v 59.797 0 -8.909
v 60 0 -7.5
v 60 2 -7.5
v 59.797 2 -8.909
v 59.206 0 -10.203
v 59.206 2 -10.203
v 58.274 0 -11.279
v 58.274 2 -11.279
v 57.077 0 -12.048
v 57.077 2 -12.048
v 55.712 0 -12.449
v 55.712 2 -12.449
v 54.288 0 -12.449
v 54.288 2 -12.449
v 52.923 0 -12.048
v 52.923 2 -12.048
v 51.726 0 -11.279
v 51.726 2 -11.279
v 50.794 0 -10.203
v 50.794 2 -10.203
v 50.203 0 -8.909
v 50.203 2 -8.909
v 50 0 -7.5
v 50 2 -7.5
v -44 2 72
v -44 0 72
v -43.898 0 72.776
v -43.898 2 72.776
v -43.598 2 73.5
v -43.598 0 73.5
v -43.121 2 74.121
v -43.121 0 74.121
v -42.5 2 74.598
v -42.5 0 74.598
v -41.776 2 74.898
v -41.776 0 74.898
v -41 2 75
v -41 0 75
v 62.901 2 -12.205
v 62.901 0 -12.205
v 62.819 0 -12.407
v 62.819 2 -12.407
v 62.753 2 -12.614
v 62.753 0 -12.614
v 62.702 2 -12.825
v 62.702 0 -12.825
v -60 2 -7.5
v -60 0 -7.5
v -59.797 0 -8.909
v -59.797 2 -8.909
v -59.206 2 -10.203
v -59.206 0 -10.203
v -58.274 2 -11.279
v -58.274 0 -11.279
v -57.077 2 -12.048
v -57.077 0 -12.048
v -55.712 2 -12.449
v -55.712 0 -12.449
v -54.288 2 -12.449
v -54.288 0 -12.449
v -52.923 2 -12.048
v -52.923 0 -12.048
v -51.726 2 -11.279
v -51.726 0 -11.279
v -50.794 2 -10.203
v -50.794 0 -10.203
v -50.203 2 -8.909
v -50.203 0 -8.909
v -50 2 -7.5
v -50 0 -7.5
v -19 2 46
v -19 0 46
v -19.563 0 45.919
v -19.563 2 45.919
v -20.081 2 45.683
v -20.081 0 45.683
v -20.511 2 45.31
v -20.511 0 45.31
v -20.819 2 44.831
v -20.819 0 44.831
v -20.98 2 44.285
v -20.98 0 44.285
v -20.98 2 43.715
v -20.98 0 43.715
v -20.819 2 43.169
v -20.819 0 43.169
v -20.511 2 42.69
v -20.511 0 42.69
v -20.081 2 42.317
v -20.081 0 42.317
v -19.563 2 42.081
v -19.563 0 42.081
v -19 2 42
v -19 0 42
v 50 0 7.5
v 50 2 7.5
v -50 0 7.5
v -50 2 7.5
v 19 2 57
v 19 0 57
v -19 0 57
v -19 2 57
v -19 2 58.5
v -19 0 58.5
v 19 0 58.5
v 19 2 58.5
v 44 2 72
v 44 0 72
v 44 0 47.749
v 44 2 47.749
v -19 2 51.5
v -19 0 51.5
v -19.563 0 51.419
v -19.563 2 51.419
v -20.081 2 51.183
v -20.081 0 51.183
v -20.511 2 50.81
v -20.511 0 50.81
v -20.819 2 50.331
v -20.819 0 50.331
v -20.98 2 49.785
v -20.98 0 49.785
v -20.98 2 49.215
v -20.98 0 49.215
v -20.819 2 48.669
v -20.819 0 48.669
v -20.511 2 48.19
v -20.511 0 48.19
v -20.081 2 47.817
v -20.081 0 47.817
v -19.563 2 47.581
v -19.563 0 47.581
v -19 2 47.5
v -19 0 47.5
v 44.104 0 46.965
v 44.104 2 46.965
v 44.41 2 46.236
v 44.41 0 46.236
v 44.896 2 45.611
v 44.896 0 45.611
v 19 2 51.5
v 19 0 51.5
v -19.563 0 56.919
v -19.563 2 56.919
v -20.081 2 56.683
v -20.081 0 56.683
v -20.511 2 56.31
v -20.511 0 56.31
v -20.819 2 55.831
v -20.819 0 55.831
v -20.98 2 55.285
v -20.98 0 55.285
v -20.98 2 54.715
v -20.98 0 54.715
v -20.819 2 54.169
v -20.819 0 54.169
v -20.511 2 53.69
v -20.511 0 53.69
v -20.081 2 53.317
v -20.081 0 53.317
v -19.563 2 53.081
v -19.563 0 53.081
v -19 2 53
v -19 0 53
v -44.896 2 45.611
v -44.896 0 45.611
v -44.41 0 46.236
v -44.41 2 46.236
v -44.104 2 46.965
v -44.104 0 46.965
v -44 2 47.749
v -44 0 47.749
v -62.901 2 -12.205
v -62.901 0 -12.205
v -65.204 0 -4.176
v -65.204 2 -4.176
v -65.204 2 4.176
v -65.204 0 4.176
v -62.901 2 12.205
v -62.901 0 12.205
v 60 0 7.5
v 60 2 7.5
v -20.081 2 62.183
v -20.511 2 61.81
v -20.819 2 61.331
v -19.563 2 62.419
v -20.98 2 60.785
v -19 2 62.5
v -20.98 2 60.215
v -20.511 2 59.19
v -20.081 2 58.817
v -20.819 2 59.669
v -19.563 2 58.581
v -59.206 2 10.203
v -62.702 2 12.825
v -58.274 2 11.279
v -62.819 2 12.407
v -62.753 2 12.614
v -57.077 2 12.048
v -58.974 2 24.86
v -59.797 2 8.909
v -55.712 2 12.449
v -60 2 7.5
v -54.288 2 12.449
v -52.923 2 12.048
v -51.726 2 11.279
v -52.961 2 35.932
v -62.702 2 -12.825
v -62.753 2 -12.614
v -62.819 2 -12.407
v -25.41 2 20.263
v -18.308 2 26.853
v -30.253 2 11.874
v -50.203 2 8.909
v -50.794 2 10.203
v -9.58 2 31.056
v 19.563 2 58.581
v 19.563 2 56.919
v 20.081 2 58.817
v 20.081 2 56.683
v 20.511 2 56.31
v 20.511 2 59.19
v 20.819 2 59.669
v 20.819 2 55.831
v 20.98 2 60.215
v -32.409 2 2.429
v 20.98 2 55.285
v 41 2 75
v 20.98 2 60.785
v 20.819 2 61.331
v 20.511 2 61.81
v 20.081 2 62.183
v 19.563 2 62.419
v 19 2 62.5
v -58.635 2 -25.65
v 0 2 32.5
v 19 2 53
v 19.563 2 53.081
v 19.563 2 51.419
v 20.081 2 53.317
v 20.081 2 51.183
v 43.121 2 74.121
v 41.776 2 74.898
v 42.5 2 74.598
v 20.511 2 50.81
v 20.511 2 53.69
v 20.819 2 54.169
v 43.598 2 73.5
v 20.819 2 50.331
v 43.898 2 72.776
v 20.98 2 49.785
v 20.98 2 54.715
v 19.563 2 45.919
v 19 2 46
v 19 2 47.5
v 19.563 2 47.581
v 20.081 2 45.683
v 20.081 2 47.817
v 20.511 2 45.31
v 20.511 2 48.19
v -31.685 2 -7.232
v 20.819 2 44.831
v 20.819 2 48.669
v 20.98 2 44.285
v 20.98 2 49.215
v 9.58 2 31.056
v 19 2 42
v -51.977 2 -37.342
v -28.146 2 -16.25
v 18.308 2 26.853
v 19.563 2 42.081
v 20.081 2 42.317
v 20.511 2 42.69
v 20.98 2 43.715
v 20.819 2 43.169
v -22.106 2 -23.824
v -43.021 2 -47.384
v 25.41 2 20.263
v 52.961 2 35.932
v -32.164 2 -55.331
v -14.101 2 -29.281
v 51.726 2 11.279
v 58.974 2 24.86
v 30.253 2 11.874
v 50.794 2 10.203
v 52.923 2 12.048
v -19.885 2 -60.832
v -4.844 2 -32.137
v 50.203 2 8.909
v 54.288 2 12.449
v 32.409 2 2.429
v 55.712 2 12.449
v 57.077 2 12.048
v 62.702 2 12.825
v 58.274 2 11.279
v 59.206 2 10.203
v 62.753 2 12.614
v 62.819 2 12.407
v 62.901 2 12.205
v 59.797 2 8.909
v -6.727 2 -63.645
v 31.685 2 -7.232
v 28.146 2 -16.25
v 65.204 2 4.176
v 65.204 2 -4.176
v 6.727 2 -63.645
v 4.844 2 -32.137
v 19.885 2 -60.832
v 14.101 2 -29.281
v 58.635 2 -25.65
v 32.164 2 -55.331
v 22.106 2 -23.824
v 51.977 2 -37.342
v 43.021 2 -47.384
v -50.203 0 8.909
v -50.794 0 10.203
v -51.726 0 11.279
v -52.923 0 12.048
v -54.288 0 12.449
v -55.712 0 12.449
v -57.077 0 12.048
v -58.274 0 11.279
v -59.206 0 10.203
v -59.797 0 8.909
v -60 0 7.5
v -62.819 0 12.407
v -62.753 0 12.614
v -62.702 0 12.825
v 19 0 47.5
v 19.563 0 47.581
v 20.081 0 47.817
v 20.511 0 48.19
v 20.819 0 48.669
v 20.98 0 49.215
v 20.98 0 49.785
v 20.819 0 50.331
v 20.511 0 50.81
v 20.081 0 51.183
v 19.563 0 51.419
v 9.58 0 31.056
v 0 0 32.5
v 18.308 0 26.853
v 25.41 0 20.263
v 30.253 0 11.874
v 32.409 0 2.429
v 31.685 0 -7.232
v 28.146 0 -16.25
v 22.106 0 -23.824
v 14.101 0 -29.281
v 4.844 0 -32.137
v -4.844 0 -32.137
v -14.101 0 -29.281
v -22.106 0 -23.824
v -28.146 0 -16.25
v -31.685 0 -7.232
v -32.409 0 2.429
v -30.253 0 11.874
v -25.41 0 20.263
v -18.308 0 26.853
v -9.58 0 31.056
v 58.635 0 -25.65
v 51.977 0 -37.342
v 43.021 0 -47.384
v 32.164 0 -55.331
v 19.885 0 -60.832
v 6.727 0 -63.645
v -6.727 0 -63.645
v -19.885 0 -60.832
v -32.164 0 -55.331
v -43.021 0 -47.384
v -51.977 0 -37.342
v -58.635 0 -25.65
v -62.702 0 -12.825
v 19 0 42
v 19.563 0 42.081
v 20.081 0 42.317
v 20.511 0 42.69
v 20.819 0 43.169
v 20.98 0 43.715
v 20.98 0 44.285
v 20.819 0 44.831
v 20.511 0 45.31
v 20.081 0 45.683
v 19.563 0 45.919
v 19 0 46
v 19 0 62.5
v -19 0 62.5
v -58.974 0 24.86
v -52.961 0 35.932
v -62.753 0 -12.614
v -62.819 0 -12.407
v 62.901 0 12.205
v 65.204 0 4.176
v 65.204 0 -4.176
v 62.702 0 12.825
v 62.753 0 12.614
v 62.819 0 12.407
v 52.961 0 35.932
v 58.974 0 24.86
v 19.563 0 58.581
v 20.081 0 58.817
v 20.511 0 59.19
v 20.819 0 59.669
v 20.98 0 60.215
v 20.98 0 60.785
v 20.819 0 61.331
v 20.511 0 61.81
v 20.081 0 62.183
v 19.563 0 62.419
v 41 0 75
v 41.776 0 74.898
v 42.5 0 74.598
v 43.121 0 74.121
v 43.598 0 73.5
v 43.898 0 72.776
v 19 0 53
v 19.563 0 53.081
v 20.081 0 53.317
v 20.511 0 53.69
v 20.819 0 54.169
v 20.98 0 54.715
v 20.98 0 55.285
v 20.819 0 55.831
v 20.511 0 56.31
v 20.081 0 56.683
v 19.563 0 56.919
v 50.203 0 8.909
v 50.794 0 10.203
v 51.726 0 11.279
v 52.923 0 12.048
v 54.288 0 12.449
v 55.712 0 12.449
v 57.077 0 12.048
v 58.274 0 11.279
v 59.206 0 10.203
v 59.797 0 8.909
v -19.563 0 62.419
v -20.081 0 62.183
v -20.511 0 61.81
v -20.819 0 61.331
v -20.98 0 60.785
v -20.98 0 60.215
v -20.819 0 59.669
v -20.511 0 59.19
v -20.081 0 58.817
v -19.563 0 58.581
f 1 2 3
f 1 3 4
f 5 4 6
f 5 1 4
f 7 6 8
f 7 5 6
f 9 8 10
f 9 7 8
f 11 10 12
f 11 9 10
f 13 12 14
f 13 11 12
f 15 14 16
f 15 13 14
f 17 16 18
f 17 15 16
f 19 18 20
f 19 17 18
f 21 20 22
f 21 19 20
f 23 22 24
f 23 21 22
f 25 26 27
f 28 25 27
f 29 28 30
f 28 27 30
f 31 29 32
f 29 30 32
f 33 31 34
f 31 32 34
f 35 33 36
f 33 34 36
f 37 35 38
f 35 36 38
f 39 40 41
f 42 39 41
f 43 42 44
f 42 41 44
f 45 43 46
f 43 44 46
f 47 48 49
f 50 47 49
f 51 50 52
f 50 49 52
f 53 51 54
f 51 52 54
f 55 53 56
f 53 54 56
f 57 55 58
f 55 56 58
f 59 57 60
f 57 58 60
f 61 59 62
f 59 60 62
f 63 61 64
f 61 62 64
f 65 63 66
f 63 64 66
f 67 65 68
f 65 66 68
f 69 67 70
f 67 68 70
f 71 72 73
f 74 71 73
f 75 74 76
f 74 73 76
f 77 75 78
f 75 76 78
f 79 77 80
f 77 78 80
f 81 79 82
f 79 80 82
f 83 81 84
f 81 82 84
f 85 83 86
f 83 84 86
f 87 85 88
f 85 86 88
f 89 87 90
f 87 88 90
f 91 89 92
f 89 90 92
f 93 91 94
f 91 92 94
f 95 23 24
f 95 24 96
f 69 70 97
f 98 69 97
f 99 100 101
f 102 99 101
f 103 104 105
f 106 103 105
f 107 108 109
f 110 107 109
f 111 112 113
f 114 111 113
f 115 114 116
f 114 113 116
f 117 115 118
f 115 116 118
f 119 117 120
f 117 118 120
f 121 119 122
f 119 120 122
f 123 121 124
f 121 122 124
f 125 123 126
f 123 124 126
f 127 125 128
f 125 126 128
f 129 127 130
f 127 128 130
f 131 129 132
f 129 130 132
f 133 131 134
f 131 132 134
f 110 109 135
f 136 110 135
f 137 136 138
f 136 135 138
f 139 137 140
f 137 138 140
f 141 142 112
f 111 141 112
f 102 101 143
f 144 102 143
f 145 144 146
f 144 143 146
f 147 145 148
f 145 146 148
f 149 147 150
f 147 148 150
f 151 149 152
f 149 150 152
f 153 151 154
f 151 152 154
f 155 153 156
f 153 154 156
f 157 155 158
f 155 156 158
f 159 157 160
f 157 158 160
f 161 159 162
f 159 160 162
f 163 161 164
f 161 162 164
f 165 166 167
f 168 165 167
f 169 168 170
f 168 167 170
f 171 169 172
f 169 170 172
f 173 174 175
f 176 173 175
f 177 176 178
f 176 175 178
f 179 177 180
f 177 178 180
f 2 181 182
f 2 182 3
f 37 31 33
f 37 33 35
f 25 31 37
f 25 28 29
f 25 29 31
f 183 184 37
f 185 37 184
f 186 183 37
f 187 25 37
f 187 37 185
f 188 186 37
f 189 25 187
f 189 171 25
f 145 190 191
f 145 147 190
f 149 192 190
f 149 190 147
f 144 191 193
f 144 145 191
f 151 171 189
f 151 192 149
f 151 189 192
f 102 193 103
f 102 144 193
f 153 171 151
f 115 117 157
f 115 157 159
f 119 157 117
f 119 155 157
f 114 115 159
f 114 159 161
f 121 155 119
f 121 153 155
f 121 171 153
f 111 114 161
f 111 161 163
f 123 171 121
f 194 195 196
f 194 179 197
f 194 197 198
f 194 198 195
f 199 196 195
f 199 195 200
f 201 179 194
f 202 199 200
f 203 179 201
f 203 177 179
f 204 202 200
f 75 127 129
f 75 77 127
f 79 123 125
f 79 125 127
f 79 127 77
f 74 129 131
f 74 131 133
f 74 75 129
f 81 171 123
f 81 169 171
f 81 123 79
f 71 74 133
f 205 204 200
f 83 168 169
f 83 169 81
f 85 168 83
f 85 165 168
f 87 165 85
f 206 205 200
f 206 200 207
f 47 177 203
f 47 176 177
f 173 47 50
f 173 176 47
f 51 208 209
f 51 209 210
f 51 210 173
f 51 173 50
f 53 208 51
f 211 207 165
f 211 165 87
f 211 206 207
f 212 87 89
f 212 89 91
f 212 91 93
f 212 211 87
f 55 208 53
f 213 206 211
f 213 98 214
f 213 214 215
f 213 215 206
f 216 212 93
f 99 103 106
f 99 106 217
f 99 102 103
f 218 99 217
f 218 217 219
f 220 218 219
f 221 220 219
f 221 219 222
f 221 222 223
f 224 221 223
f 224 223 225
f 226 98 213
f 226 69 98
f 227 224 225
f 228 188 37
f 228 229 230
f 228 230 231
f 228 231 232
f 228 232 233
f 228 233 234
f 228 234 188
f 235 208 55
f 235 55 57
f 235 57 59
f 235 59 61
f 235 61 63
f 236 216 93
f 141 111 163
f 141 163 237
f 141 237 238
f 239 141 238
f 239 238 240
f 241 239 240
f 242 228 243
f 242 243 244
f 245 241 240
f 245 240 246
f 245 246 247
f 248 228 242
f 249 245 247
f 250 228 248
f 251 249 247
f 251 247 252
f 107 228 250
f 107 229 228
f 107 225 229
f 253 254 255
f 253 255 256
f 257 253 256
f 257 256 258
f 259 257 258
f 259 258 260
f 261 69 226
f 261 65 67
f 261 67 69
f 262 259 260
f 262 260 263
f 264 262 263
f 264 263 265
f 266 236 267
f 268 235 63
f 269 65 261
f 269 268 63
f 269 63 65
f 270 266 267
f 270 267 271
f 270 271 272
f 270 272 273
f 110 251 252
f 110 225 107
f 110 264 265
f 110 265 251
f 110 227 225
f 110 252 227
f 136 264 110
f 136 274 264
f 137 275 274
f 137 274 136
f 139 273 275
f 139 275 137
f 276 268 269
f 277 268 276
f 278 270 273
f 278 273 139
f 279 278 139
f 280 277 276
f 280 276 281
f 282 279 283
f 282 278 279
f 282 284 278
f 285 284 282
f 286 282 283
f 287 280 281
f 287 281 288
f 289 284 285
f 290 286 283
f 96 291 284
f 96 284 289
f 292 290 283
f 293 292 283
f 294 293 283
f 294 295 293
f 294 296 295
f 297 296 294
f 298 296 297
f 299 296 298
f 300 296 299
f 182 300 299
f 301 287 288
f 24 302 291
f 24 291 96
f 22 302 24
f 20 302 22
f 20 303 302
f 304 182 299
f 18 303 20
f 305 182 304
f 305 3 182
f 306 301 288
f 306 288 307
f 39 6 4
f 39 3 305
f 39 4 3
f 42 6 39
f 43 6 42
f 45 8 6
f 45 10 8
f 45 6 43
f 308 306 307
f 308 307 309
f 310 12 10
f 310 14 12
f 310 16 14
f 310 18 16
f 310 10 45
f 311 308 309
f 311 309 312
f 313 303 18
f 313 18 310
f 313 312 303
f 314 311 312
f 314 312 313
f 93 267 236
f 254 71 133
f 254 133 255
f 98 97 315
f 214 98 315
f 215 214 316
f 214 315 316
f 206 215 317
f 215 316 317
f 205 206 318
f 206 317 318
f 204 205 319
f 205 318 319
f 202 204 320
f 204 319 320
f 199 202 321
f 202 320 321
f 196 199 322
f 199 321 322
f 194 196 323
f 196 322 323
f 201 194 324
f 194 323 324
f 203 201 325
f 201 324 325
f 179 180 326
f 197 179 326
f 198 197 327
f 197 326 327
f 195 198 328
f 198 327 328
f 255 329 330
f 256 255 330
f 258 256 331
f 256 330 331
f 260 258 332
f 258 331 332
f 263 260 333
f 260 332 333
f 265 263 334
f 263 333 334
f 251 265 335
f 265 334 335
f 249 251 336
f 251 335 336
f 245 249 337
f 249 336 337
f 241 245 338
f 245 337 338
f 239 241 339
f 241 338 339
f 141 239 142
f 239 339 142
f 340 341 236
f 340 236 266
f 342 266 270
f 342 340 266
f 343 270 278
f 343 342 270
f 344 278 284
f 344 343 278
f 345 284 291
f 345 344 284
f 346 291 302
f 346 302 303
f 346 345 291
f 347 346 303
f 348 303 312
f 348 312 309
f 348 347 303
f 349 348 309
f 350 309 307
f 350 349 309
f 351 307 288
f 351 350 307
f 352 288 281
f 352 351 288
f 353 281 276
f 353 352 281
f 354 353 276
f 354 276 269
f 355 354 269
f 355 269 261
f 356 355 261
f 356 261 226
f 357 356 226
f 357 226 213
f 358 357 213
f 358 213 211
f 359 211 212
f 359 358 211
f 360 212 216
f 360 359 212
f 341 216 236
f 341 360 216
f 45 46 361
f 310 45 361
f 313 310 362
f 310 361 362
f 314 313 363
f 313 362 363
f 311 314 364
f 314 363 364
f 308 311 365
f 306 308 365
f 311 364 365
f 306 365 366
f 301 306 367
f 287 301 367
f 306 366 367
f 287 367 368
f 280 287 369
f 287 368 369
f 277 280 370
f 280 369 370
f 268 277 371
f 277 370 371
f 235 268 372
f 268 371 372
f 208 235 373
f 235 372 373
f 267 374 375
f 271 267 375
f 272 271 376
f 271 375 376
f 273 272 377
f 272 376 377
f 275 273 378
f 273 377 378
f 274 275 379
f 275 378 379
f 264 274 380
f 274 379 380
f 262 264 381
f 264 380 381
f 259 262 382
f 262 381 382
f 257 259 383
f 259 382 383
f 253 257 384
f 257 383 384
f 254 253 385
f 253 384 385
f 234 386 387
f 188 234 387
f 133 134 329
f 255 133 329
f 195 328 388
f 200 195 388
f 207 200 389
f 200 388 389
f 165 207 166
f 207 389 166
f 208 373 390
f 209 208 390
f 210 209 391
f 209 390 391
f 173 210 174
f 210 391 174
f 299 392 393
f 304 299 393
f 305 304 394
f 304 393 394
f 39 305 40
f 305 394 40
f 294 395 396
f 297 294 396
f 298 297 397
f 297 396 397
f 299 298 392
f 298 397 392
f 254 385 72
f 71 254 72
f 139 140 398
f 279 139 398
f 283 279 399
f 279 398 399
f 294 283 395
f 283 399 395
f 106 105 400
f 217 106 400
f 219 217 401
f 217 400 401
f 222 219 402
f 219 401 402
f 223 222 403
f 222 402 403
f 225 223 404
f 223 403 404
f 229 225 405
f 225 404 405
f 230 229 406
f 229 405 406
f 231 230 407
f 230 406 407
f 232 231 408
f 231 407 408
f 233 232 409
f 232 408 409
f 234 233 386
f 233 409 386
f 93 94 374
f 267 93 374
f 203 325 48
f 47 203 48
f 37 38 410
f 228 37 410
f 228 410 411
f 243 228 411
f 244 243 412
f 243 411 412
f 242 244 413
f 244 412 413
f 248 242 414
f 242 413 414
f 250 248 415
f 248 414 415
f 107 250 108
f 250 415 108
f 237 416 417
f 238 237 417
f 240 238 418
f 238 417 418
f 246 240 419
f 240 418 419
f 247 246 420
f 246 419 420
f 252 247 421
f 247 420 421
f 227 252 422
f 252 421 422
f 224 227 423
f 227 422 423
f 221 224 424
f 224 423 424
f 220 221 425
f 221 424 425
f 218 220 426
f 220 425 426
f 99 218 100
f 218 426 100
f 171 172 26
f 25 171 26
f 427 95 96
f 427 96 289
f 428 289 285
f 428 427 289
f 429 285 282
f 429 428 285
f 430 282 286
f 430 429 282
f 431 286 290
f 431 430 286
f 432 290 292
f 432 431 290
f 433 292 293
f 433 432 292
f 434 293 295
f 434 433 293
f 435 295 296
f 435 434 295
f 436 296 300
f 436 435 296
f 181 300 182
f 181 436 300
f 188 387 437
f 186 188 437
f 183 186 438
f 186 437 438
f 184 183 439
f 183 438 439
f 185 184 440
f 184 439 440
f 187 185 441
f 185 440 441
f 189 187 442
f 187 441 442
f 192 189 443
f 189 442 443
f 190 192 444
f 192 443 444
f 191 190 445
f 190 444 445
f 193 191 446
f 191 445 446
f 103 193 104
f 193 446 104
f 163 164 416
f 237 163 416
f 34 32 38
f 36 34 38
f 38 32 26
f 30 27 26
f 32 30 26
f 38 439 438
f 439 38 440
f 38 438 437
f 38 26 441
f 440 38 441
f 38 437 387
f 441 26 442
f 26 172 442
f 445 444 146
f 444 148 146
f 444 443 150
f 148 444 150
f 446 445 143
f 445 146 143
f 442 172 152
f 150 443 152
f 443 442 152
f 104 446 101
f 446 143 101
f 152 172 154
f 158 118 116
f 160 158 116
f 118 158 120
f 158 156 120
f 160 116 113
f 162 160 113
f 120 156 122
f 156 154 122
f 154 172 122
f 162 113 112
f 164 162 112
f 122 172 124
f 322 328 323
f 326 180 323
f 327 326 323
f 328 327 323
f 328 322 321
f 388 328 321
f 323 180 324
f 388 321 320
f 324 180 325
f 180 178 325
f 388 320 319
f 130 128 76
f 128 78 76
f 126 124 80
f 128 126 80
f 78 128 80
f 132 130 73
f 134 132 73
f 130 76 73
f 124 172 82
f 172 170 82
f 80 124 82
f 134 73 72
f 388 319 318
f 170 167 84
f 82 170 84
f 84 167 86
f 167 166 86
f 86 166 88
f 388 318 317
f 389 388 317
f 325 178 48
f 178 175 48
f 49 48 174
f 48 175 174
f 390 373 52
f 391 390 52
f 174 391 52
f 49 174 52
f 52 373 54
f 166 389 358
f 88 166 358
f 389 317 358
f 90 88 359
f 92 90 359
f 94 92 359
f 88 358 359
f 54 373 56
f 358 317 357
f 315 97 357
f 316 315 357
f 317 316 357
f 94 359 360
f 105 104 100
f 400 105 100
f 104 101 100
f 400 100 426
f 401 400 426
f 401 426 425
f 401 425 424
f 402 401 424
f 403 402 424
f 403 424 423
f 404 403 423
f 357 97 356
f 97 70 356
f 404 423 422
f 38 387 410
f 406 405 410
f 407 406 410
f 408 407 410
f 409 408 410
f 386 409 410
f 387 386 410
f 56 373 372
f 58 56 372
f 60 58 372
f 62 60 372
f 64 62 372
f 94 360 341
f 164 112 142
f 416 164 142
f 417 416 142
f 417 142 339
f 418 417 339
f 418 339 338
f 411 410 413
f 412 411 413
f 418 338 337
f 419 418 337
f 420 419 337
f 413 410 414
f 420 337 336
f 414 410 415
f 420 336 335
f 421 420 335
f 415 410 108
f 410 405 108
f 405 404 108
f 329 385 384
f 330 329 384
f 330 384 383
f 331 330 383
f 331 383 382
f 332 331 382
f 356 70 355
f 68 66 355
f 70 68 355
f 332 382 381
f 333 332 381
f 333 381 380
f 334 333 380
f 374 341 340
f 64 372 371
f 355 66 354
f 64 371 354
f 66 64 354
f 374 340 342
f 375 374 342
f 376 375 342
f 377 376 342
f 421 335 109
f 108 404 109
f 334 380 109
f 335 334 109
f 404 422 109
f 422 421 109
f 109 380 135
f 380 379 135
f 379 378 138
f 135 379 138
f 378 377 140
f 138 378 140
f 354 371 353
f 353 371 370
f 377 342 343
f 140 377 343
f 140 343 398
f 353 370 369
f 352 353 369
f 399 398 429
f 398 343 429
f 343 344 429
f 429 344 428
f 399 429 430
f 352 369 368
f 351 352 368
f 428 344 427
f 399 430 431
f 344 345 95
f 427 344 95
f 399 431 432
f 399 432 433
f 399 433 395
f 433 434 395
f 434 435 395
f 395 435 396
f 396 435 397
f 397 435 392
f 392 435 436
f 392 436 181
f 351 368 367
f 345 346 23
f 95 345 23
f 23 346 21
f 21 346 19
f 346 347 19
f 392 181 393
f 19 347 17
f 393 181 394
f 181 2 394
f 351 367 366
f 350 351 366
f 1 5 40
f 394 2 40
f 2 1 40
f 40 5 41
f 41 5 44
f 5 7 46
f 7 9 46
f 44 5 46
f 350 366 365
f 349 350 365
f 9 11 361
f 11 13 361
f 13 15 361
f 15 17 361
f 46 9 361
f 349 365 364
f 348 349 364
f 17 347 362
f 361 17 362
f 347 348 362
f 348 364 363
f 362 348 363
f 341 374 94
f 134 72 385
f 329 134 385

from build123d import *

# Parameters (mm, degrees)
SKETCH1_R           = 32.5
BOSS_EXTRUDE1_DEPTH = 2


with BuildPart() as part:
    # Sketch1 → Boss-Extrude1 (new body)
    with BuildSketch(Plane(origin=(0, 0, 0), x_dir=(1, 0, 0), z_dir=(0, 1, 0))):
        with BuildLine():
            Line((-41, -75), (41, -75))
            ThreePointArc((41, -75), (43.121320344, -74.121320344), (44, -72))
            Line((44, -72), (44, -47.749345545))
            ThreePointArc((44, -47.749345545), (44.232922766, -46.590344431), (44.895522388, -45.611315148))
            ThreePointArc((44.895522388, -45.611315148), (56.240897341, -30.544417924), (62.701869476, -12.824802695))
            ThreePointArc((62.701869476, -12.824802695), (62.784364017, -12.509712717), (62.900531241, -12.20542302))
            ThreePointArc((62.900531241, -12.20542302), (65.495647572, 0), (62.900531241, 12.20542302))
            ThreePointArc((62.900531241, 12.20542302), (62.784364017, 12.509712717), (62.701869476, 12.824802695))
            ThreePointArc((62.701869476, 12.824802695), (0, 64), (-62.701869476, 12.824802695))
            ThreePointArc((-62.701869476, 12.824802695), (-62.784364017, 12.509712717), (-62.900531241, 12.20542302))
            ThreePointArc((-62.900531241, 12.20542302), (-65.495647572, 0), (-62.900531241, -12.20542302))
            ThreePointArc((-62.900531241, -12.20542302), (-62.784364017, -12.509712717), (-62.701869476, -12.824802695))
            ThreePointArc((-62.701869476, -12.824802695), (-56.240897341, -30.544417924), (-44.895522388, -45.611315148))
            ThreePointArc((-44.895522388, -45.611315148), (-44.232922766, -46.590344431), (-44, -47.749345545))
            Line((-44, -47.749345545), (-44, -72))
            ThreePointArc((-44, -72), (-43.121320344, -74.121320344), (-41, -75))
        make_face()
        with Locations(Location((0, 0, 0), (0, 0, 270))):
            Circle(SKETCH1_R, mode=Mode.SUBTRACT)
        with BuildLine():
            Line((-50, 7.5), (-50, -7.5))
            ThreePointArc((-50, -7.5), (-55, -12.5), (-60, -7.5))
            Line((-60, -7.5), (-60, 7.5))
            ThreePointArc((-60, 7.5), (-55, 12.5), (-50, 7.5))
        make_face(mode=Mode.SUBTRACT)
        with BuildLine():
            Line((50, 7.5), (50, -7.5))
            ThreePointArc((50, -7.5), (55, -12.5), (60, -7.5))
            Line((60, -7.5), (60, 7.5))
            ThreePointArc((60, 7.5), (55, 12.5), (50, 7.5))
        make_face(mode=Mode.SUBTRACT)
        with BuildLine():
            Line((-19, -42), (19, -42))
            ThreePointArc((19, -42), (21, -44), (19, -46))
            Line((19, -46), (-19, -46))
            ThreePointArc((-19, -46), (-21, -44), (-19, -42))
        make_face(mode=Mode.SUBTRACT)
        with BuildLine():
            Line((-19, -47.5), (19, -47.5))
            ThreePointArc((19, -47.5), (21, -49.5), (19, -51.5))
            Line((19, -51.5), (-19, -51.5))
            ThreePointArc((-19, -51.5), (-21, -49.5), (-19, -47.5))
        make_face(mode=Mode.SUBTRACT)
        with BuildLine():
            Line((-19, -53), (19, -53))
            ThreePointArc((19, -53), (21, -55), (19, -57))
            Line((19, -57), (-19, -57))
            ThreePointArc((-19, -57), (-21, -55), (-19, -53))
        make_face(mode=Mode.SUBTRACT)
        with BuildLine():
            Line((-19, -58.5), (19, -58.5))
            ThreePointArc((19, -58.5), (21, -60.5), (19, -62.5))
            Line((19, -62.5), (-19, -62.5))
            ThreePointArc((-19, -62.5), (-21, -60.5), (-19, -58.5))
        make_face(mode=Mode.SUBTRACT)
    extrude(amount=BOSS_EXTRUDE1_DEPTH)


solid = part.part
